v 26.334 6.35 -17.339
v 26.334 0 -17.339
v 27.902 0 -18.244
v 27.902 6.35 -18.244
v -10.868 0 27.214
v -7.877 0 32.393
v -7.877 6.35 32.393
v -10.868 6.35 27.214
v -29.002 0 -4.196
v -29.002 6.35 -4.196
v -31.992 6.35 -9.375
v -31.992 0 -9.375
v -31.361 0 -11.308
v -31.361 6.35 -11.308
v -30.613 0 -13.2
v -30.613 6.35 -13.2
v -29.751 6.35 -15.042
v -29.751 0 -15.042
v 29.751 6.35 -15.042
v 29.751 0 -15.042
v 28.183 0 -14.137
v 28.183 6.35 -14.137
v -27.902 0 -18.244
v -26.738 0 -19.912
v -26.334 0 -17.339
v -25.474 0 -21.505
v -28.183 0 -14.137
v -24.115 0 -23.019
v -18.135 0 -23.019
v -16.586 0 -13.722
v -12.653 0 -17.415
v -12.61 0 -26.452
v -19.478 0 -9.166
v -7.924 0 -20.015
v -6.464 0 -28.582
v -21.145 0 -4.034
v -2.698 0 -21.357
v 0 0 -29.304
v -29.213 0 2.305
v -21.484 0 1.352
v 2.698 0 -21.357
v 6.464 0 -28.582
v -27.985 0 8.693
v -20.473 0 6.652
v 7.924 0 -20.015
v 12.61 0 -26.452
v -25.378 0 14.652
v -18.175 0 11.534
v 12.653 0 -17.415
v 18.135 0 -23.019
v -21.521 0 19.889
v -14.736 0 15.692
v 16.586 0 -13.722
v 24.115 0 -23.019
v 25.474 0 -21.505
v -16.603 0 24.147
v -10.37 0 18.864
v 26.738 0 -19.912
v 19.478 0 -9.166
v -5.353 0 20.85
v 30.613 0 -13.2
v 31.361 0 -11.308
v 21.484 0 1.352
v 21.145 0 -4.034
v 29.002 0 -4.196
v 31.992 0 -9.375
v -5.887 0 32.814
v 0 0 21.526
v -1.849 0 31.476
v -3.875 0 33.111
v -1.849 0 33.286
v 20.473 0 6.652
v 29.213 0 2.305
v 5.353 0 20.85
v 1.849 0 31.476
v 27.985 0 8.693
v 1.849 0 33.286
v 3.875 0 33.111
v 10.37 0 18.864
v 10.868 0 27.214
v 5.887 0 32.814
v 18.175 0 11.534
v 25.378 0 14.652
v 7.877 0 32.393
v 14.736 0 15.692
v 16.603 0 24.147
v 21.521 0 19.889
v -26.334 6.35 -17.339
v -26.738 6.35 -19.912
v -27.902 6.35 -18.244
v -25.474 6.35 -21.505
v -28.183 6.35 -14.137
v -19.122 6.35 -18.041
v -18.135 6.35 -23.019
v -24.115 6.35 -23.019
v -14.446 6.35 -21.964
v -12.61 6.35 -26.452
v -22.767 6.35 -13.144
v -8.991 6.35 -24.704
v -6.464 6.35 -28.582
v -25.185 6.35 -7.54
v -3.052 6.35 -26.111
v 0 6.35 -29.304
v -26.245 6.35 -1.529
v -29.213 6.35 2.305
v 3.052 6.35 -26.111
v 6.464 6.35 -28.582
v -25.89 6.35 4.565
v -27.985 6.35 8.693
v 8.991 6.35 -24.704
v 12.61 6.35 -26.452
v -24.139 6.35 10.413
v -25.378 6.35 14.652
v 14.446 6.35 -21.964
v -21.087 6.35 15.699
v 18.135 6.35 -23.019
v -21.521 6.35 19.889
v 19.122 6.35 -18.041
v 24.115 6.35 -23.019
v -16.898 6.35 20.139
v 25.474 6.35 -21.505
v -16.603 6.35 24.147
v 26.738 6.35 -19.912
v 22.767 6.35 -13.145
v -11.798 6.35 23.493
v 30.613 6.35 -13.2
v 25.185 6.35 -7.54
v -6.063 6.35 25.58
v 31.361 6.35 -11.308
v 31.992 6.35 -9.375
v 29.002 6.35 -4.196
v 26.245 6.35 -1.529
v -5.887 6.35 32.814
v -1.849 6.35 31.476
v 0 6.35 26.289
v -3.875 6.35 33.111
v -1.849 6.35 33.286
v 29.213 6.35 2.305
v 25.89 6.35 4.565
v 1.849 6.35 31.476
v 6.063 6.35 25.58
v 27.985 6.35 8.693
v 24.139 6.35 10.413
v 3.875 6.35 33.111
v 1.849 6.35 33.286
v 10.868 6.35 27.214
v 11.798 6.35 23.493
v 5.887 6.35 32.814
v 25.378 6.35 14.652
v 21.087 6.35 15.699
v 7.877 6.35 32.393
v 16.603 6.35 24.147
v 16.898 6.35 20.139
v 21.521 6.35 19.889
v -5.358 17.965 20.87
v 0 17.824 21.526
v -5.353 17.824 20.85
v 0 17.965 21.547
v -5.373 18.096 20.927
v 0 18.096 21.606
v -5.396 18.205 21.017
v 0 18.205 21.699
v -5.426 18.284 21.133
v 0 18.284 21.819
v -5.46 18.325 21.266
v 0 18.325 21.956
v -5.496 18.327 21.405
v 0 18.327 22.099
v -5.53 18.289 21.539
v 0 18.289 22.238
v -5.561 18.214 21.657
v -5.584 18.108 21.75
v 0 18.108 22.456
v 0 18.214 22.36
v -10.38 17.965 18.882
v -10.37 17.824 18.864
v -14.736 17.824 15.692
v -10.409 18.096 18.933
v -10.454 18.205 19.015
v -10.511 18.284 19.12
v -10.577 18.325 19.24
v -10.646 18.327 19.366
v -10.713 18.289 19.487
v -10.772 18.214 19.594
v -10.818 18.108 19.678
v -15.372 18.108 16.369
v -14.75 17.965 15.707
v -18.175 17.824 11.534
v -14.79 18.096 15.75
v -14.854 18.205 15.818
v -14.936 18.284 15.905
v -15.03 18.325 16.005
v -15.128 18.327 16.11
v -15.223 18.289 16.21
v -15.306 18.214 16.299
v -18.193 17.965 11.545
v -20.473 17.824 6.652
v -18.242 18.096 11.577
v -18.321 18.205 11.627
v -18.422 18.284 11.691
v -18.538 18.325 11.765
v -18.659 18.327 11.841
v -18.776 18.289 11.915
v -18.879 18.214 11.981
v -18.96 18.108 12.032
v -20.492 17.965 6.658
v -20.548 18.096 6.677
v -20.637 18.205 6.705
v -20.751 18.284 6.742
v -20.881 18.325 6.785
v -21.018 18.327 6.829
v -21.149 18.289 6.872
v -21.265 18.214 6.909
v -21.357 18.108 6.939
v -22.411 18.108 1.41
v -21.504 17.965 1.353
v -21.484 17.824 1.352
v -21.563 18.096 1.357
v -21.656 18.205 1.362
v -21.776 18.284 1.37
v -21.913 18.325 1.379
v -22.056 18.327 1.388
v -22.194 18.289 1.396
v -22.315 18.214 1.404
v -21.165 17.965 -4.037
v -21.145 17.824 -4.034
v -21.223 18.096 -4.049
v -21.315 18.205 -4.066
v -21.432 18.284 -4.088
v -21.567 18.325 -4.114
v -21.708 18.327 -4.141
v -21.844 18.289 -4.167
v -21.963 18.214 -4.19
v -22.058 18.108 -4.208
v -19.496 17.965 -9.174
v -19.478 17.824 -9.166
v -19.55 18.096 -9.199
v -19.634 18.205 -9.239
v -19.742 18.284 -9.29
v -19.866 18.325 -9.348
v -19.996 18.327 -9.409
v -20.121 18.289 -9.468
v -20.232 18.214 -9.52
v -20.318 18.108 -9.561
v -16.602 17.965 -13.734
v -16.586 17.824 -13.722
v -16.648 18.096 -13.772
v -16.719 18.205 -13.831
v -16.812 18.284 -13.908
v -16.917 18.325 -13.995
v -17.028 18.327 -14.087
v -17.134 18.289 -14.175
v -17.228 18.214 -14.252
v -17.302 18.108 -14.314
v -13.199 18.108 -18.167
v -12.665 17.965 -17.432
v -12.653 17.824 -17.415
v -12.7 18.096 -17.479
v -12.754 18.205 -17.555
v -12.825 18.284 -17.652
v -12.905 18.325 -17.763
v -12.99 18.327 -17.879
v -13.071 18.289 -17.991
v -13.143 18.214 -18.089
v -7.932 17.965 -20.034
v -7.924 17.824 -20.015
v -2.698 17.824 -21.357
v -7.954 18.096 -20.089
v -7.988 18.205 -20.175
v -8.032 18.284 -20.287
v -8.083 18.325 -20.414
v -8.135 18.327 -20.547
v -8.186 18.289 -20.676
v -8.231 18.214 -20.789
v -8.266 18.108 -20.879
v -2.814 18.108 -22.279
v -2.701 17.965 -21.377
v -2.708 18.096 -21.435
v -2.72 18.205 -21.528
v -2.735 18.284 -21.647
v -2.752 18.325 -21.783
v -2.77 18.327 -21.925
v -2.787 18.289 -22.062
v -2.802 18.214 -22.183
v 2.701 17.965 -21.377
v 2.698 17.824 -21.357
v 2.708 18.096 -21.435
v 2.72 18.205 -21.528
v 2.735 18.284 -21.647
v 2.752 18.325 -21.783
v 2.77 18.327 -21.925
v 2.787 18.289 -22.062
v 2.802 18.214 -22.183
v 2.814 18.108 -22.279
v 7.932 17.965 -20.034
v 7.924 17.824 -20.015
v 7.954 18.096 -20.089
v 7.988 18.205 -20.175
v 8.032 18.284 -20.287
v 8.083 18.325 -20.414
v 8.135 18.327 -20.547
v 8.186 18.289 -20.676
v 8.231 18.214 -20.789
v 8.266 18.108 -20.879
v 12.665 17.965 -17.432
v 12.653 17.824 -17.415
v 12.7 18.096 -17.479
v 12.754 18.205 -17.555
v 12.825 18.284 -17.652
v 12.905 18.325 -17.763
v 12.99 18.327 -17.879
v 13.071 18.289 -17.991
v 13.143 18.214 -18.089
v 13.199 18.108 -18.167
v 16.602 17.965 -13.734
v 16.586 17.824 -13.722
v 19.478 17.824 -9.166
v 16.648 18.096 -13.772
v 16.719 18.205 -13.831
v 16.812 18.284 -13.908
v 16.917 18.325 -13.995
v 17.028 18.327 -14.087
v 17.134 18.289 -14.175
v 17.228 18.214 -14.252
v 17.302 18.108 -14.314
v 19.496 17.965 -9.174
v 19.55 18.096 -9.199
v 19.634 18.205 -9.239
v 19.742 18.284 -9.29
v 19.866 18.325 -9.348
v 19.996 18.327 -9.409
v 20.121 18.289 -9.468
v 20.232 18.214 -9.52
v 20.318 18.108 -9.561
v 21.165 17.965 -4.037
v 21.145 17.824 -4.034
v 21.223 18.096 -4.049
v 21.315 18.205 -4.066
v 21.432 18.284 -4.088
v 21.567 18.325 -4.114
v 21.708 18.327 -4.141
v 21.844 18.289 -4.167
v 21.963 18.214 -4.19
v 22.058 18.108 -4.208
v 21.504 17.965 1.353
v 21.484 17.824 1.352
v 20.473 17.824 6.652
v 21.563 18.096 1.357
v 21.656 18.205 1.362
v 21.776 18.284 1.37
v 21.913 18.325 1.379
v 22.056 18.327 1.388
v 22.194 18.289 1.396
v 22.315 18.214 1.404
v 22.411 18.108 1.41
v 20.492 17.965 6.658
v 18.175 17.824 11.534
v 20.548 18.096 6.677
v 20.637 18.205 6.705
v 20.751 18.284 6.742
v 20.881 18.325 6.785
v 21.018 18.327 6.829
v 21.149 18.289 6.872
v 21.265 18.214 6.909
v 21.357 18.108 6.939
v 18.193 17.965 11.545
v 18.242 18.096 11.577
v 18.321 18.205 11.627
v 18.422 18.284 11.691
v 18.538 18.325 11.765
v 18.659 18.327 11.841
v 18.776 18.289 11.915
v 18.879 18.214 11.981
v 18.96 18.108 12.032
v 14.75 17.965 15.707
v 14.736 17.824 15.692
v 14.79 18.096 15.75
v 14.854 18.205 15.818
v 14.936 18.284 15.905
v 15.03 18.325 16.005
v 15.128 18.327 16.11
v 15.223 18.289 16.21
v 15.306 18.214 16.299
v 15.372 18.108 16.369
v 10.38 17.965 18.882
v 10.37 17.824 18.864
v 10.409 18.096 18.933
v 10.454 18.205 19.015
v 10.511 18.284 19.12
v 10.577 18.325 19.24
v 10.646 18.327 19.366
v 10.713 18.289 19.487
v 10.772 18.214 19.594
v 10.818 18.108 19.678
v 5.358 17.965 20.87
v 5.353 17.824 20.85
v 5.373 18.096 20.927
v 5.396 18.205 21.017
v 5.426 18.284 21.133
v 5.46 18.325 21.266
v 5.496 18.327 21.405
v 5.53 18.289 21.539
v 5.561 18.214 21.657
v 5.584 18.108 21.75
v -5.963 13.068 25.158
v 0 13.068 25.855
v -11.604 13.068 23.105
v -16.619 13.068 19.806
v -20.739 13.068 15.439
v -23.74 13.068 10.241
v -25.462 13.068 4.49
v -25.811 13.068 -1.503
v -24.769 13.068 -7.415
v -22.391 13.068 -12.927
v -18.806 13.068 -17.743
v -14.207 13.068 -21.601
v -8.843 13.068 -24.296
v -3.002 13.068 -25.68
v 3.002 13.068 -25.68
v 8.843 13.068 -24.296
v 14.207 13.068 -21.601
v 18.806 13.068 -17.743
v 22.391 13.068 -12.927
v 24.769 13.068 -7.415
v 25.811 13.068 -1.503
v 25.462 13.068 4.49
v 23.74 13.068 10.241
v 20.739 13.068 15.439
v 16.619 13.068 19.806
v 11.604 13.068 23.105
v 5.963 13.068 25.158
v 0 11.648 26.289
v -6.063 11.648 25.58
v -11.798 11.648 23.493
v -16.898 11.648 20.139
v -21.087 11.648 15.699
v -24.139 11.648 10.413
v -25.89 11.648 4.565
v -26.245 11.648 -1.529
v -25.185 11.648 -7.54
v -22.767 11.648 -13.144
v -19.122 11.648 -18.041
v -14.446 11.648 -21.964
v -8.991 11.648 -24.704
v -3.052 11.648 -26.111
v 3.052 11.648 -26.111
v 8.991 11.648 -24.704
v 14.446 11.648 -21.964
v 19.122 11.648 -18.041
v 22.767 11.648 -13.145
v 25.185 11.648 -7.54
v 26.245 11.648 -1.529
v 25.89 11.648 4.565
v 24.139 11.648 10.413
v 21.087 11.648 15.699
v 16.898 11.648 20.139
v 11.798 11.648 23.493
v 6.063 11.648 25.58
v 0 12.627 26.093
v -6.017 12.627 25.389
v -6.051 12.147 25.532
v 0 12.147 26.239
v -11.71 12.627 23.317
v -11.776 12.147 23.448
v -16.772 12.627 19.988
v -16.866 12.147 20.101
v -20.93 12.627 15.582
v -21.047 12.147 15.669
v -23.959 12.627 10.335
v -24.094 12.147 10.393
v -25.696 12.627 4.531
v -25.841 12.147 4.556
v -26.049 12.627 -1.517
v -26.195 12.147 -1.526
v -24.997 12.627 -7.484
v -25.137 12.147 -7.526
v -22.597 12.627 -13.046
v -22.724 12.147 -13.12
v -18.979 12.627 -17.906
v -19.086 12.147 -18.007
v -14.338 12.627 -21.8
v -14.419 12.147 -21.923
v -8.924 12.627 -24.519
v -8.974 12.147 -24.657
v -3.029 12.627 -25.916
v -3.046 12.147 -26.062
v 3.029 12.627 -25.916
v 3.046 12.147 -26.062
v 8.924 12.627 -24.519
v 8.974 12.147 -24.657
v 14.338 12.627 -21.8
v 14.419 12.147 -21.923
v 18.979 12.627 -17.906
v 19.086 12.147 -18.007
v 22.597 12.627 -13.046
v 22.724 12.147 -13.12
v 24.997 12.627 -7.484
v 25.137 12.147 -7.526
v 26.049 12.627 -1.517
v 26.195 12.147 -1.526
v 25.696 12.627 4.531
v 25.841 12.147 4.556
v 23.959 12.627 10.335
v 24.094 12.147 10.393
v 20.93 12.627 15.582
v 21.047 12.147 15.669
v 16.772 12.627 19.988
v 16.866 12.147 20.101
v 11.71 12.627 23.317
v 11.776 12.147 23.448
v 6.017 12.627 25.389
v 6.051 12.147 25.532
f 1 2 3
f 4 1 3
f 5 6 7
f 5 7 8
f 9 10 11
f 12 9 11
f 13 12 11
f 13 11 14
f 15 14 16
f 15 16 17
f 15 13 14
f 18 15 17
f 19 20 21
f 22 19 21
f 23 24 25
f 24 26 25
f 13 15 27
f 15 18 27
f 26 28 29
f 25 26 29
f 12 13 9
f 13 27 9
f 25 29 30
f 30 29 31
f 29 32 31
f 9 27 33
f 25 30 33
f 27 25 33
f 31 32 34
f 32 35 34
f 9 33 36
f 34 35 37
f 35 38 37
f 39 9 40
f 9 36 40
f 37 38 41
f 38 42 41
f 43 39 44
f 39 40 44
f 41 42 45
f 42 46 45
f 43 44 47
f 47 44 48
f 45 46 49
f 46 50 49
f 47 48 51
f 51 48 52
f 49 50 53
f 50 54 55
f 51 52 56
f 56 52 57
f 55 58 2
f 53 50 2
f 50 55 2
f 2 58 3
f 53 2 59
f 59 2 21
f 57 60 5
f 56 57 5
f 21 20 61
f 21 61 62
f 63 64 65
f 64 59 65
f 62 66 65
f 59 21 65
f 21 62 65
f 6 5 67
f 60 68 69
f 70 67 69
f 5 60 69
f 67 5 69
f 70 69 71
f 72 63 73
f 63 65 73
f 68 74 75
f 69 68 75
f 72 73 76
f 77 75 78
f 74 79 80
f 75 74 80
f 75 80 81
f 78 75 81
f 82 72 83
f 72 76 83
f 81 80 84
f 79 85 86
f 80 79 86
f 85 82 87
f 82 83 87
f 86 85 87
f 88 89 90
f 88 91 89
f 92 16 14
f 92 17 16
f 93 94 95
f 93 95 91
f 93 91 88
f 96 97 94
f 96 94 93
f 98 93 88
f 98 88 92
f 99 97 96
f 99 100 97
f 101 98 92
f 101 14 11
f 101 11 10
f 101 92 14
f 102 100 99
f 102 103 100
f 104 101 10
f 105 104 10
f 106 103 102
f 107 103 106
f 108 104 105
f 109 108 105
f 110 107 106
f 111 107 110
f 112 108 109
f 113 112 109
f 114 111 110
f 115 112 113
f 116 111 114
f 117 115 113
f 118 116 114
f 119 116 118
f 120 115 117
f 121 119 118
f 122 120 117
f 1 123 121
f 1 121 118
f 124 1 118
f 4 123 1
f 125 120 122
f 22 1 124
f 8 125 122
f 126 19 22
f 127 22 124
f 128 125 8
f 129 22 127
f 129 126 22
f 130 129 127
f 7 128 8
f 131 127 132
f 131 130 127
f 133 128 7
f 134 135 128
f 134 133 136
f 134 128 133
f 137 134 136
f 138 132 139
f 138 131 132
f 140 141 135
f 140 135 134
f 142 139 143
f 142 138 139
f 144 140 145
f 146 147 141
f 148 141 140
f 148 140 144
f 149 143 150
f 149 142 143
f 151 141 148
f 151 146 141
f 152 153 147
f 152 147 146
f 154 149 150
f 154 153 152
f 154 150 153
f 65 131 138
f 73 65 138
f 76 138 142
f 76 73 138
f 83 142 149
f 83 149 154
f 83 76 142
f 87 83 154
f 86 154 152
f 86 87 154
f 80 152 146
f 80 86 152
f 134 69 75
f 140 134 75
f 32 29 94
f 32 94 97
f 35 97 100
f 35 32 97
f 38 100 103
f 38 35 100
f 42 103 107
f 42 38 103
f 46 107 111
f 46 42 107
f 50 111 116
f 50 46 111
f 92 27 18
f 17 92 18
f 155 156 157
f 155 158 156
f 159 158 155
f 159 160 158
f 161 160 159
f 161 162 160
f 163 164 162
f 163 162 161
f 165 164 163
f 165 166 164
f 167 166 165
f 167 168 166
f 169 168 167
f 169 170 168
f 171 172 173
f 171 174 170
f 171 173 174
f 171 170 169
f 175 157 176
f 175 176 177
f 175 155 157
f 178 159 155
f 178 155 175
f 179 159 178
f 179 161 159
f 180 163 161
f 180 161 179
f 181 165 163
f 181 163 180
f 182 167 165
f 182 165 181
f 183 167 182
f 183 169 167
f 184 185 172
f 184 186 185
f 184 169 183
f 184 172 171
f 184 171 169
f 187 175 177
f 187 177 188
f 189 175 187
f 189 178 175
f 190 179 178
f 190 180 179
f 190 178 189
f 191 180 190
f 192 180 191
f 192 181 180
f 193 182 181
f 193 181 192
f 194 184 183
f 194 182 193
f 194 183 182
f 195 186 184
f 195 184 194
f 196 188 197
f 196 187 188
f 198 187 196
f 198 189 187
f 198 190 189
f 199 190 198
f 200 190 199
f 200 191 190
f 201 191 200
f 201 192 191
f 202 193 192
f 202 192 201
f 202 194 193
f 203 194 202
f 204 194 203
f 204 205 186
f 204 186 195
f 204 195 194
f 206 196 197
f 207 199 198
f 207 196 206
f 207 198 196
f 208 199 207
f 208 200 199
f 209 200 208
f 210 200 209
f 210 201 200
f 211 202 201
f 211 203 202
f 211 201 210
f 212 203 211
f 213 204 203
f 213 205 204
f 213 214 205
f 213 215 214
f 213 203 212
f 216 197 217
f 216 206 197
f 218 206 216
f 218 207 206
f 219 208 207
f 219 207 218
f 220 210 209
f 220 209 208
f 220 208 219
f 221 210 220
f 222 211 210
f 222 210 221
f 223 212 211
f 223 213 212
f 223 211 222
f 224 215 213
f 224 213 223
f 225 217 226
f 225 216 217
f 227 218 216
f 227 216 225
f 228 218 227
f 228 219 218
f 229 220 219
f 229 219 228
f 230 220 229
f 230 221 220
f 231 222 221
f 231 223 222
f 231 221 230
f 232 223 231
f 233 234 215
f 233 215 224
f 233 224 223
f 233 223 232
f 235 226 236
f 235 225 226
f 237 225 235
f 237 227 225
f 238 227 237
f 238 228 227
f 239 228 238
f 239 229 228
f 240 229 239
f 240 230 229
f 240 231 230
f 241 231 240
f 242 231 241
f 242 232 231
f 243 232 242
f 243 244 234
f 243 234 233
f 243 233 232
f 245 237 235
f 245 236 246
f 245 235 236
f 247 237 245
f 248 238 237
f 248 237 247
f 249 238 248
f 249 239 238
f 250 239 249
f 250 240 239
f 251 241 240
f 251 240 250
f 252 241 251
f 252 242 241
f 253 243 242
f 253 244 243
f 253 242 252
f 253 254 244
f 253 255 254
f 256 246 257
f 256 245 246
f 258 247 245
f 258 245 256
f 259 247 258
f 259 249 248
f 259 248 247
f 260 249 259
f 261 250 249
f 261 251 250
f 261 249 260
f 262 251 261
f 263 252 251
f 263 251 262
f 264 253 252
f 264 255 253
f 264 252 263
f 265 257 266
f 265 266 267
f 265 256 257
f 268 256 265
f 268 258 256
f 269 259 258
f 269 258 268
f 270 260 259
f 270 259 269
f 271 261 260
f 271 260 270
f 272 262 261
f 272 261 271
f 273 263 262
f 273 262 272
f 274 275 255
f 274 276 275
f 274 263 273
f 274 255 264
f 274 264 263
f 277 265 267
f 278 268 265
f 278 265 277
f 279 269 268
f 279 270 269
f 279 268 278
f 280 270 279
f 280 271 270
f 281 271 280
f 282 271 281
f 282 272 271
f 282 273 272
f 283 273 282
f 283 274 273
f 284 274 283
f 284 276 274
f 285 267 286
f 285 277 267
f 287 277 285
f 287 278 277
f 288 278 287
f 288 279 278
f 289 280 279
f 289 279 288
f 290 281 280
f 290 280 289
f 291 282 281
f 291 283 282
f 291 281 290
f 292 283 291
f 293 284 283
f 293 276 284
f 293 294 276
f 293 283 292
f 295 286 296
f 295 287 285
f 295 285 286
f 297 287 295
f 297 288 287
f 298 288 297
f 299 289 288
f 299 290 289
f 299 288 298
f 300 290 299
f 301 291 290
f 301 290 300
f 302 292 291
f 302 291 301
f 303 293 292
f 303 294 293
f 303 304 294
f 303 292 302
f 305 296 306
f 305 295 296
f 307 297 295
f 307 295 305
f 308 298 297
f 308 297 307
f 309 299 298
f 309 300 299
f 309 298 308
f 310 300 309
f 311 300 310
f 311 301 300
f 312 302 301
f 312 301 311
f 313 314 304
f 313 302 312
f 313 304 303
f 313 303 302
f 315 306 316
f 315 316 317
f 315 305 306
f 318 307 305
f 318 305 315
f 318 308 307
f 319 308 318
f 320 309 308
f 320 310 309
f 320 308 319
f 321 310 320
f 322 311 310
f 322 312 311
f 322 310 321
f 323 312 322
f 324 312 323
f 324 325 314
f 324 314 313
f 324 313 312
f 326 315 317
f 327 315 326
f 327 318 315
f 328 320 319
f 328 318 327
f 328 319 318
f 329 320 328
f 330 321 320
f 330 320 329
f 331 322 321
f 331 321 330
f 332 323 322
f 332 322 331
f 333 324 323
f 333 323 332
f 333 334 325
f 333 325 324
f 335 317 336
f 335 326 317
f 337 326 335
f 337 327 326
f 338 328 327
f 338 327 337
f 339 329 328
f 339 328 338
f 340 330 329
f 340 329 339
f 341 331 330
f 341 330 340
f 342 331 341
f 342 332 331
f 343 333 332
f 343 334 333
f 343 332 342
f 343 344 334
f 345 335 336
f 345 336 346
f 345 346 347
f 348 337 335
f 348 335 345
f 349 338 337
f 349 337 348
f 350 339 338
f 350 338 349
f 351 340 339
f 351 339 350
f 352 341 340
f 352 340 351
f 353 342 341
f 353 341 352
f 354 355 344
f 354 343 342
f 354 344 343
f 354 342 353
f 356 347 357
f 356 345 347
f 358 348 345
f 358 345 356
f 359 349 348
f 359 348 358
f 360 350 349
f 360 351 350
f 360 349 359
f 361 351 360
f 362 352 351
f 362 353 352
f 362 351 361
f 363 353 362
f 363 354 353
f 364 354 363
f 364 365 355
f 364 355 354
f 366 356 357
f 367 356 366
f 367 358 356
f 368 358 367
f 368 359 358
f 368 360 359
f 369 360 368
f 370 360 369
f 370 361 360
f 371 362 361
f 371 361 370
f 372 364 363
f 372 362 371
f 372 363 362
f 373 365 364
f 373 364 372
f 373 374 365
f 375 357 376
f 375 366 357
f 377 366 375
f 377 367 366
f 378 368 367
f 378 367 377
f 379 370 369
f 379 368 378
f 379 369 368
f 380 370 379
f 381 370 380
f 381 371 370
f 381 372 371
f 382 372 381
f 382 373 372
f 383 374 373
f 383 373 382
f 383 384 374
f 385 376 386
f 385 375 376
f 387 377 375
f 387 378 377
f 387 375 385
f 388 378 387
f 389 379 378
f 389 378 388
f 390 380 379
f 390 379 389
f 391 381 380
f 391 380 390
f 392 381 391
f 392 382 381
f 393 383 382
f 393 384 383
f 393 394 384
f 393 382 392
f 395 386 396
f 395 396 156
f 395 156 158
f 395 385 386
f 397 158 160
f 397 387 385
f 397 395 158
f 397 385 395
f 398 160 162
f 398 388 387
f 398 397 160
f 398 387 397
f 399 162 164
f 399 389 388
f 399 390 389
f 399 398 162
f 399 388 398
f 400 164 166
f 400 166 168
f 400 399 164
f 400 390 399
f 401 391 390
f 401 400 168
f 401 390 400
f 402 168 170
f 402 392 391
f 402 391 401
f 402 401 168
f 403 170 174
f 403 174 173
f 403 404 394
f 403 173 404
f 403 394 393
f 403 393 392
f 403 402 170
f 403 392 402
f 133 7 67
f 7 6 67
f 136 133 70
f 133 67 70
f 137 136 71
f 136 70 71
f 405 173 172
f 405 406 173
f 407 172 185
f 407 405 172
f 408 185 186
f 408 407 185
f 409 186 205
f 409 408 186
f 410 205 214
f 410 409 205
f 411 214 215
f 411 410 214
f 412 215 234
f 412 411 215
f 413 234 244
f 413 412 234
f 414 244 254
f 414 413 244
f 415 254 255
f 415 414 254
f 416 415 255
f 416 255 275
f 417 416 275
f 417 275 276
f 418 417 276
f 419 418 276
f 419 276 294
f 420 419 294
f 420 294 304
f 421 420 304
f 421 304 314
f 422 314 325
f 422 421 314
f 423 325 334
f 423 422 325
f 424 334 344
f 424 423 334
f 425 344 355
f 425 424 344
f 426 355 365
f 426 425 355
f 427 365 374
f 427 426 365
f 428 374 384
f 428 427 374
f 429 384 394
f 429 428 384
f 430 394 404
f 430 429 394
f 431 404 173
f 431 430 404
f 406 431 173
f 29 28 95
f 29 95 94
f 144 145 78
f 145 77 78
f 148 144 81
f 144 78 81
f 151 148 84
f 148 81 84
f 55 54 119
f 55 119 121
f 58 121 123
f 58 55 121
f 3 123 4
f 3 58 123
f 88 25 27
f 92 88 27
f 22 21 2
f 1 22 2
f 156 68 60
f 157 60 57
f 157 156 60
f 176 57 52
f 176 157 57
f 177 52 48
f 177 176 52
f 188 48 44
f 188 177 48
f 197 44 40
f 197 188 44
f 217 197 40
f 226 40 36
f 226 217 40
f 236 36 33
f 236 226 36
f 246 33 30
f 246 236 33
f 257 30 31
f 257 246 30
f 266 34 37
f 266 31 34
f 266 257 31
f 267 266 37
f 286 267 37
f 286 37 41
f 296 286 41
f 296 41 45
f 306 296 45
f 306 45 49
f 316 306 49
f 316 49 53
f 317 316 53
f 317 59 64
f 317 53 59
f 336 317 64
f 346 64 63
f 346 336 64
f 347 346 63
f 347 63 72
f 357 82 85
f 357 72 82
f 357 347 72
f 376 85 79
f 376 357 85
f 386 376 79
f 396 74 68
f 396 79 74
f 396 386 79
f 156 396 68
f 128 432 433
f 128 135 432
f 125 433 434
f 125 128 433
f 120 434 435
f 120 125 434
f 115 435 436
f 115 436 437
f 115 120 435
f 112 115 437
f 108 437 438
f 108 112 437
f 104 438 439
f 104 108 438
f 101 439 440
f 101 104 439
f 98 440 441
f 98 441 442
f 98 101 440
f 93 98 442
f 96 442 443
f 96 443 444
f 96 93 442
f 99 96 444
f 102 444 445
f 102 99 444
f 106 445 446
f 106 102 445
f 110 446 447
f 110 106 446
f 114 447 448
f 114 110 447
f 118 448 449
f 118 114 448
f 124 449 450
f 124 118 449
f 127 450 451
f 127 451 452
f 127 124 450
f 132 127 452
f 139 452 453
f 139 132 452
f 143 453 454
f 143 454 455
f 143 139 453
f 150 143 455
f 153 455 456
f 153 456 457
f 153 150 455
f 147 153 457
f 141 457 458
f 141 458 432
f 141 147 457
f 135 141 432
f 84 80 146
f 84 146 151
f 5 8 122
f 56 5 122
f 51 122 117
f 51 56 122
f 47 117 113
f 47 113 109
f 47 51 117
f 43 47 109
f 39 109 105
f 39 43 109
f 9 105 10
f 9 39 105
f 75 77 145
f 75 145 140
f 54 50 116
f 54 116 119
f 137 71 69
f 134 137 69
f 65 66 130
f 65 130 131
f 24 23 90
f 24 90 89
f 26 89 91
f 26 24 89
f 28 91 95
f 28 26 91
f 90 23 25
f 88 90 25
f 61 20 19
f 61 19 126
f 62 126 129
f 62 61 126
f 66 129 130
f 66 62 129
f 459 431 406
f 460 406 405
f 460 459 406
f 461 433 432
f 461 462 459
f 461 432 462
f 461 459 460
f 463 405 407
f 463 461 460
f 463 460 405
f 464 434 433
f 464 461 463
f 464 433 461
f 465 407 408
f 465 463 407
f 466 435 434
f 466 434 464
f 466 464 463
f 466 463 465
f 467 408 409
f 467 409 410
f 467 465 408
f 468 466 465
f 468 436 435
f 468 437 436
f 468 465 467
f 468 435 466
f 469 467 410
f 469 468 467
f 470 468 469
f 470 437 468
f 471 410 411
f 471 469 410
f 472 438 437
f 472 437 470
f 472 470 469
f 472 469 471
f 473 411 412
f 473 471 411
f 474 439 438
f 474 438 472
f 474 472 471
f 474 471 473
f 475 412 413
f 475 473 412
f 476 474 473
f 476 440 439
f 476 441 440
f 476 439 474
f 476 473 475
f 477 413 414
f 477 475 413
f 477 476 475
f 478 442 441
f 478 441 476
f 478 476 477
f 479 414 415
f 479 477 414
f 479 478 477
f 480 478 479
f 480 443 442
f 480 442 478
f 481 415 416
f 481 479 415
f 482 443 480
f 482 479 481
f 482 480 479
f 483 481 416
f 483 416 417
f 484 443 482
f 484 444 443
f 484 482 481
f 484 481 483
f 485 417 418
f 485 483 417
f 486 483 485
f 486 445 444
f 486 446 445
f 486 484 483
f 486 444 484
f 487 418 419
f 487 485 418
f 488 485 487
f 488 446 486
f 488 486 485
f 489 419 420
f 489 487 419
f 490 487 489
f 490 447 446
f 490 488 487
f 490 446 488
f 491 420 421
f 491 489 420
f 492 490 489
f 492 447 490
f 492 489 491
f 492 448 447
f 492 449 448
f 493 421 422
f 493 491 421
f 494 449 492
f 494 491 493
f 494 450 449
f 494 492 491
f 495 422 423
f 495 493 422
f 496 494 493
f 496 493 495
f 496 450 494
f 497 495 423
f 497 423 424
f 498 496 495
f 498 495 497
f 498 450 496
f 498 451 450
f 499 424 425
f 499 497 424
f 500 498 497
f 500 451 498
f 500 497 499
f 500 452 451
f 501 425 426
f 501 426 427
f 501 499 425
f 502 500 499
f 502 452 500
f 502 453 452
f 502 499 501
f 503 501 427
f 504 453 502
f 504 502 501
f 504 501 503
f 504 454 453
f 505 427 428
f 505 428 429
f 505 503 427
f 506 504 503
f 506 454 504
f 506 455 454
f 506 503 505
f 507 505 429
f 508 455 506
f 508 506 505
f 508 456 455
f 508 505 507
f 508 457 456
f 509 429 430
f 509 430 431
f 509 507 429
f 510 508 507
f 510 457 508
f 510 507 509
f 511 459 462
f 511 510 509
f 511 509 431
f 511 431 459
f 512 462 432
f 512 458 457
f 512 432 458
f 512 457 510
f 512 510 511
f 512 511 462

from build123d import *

# Parameters (mm, degrees)
SKETCH1_R           = 33.3375
SKETCH1_R_2         = 21.5265
BOSS_EXTRUDE1_DEPTH = 6.35
SKETCH5_R           = 39.889033067
CUT_EXTRUDE2_DEPTH  = 6.35
SKETCH6_W           = 3.697979252
SKETCH6_H           = 3.723099818
CUT_EXTRUDE3_DEPTH  = 6.35


with BuildPart() as part:
    # Sketch1 → Boss-Extrude1 (new body)
    with BuildSketch(Plane(origin=(0, 0, 0), x_dir=(1, 0, 0), z_dir=(0, 1, 0))):
        with Locations(Location((0, 0, 0), (0, 0, 270))):
            Circle(SKETCH1_R)
        with Locations(Location((0, 0, 0), (0, 0, 270))):
            Circle(SKETCH1_R_2, mode=Mode.SUBTRACT)
    extrude(amount=BOSS_EXTRUDE1_DEPTH)

    # Sketch2 → Revolve1 (revolve)
    with BuildSketch(Plane.XY, mode=Mode.PRIVATE) as revolve1_sk:
        with BuildLine():
            Line((21.5265, 6.35), (21.5265, 17.82357951))
            ThreePointArc((21.5265, 17.82357951), (21.885975678, 18.30938248), (22.455651676, 18.107648632))
            Line((22.455651676, 18.107648632), (25.85475838, 13.068243159))
            ThreePointArc((25.85475838, 13.068243159), (26.17801485, 12.390519163), (26.289, 11.647897552))
            Line((26.289, 11.647897552), (26.289, 6.35))
            Line((26.289, 6.35), (21.5265, 6.35))
        make_face()
    revolve(revolve1_sk.sketch.rotate(Axis((0, 21.224675992, 0), (0, -1, 0)), 90), axis=Axis((0, 21.224675992, 0), (0, -1, 0)))

    # Sketch5 → Cut-Extrude2 (cut)
    with BuildSketch(Plane(origin=(0, 0, 0), x_dir=(1, 0, 0), z_dir=(0, 1, 0))):
        Circle(SKETCH5_R)
        with BuildLine():
            Line((-24.11485133, 23.01875), (-18.134546198, 23.01875))
            ThreePointArc((-18.134546198, 23.01875), (0, 29.304003436), (18.134546198, 23.01875))
            Line((18.134546198, 23.01875), (24.11485133, 23.01875))
            ThreePointArc((24.11485133, 23.01875), (28.871121899, 16.66875), (31.992247929, 9.374698861))
            Line((31.992247929, 9.374698861), (29.002095362, 4.195602693))
            ThreePointArc((29.002095362, 4.195602693), (25.378011408, -14.652001718), (10.867549165, -27.214352693))
            Line((10.867549165, -27.214352693), (7.877396598, -32.393448861))
            ThreePointArc((7.877396598, -32.393448861), (0, -33.3375), (-7.877396598, -32.393448861))
            Line((-7.877396598, -32.393448861), (-10.867549165, -27.214352693))
            ThreePointArc((-10.867549165, -27.214352693), (-25.378011408, -14.652001718), (-29.002095362, 4.195602693))
            Line((-29.002095362, 4.195602693), (-31.992247929, 9.374698861))
            ThreePointArc((-31.992247929, 9.374698861), (-28.871121899, 16.66875), (-24.11485133, 23.01875))
        make_face(mode=Mode.SUBTRACT)
    extrude(amount=CUT_EXTRUDE2_DEPTH, mode=Mode.SUBTRACT)

    # Sketch6 → Cut-Extrude3 (cut)
    with BuildSketch(Plane(origin=(0, 0, 0), x_dir=(1, 0, 0), z_dir=(0, 1, 0))):
        Polygon((-28.1834672, 14.136703058), (-31.407766223, 15.998252967), (-29.558776597, 19.200796942), (-26.334477574, 17.339247033), align=None)
        with Locations((0, -33.3375)):
            Rectangle(SKETCH6_W, SKETCH6_H)
        Polygon((26.334477574, 17.339247033), (29.558776597, 19.200796942), (31.407766223, 15.998252967), (28.1834672, 14.136703058), align=None)
    extrude(amount=CUT_EXTRUDE3_DEPTH, mode=Mode.SUBTRACT)


solid = part.part
